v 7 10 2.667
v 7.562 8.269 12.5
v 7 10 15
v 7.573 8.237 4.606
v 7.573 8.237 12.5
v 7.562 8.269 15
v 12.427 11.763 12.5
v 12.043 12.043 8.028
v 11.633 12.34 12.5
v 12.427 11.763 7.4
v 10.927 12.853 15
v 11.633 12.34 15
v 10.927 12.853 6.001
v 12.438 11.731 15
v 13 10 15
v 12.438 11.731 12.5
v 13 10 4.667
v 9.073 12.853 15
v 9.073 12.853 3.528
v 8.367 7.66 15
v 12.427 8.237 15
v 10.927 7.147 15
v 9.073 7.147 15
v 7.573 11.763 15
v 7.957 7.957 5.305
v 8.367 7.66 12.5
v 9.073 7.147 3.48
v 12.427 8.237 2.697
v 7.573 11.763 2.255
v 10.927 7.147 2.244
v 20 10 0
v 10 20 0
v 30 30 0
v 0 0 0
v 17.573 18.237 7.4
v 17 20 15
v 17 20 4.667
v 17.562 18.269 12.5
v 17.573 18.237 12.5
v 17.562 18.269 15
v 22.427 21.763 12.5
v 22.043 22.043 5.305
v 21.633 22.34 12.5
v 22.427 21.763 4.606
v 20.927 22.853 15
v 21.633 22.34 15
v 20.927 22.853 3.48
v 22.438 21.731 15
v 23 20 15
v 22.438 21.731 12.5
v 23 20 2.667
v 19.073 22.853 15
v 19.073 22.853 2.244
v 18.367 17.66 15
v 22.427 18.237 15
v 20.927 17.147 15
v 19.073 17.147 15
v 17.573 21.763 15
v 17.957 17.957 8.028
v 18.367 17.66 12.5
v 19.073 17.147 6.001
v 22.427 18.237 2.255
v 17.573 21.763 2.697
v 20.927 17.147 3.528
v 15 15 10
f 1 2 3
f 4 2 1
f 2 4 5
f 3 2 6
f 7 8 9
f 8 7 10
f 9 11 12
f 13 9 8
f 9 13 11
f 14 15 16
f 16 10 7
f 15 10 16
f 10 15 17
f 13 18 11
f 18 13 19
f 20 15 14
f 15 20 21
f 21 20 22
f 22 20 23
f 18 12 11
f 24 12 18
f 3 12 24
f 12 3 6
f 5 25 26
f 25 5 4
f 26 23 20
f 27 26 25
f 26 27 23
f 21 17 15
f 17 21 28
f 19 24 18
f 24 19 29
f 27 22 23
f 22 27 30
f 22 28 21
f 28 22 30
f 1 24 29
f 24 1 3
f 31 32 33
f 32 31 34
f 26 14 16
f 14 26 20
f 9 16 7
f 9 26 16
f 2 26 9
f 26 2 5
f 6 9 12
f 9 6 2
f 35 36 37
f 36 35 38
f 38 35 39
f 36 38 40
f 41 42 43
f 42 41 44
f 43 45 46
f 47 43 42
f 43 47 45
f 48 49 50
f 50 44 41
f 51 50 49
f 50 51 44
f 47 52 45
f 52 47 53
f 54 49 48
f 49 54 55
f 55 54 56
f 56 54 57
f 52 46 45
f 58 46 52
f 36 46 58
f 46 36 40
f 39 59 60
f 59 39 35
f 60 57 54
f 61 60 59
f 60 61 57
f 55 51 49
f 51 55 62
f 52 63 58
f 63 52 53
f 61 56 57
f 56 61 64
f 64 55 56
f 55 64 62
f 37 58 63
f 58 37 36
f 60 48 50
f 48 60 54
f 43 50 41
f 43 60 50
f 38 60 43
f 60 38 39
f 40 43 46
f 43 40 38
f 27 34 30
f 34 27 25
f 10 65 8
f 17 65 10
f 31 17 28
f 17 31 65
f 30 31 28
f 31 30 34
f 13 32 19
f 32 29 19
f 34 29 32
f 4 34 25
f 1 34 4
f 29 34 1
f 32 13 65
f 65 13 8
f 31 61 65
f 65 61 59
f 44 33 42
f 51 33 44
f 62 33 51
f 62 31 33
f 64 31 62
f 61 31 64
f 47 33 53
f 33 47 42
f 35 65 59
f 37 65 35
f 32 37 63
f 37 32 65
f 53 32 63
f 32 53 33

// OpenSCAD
//PaperHolder

//Width Of Slot
Width = 1;

//Depth Of Slot
Depth = 5;

polyhedron(
    points = [[0,0,0], [30,30,0], [15,15,10], [20,10,0], [10,20,0], ],
    faces = [[0,4,3], [1,3,4], [0,3,2], [0,2,4], [2,3,1], [2,1,4]]
);
translate([10,10,0]){
    difference(){
        cylinder(15,3,3);
        translate([0,0,15]){
            rotate([0,0,135]){
                cube([Width,6,Depth], center = true);
            }
        }
    }
}
translate([20,20,0]){
    difference(){
        cylinder(15,3,3);
        translate([0,0,15]){
            rotate([0,0,135]){
                cube([Width,6,Depth], center = true);
            }
        }
    }
}
